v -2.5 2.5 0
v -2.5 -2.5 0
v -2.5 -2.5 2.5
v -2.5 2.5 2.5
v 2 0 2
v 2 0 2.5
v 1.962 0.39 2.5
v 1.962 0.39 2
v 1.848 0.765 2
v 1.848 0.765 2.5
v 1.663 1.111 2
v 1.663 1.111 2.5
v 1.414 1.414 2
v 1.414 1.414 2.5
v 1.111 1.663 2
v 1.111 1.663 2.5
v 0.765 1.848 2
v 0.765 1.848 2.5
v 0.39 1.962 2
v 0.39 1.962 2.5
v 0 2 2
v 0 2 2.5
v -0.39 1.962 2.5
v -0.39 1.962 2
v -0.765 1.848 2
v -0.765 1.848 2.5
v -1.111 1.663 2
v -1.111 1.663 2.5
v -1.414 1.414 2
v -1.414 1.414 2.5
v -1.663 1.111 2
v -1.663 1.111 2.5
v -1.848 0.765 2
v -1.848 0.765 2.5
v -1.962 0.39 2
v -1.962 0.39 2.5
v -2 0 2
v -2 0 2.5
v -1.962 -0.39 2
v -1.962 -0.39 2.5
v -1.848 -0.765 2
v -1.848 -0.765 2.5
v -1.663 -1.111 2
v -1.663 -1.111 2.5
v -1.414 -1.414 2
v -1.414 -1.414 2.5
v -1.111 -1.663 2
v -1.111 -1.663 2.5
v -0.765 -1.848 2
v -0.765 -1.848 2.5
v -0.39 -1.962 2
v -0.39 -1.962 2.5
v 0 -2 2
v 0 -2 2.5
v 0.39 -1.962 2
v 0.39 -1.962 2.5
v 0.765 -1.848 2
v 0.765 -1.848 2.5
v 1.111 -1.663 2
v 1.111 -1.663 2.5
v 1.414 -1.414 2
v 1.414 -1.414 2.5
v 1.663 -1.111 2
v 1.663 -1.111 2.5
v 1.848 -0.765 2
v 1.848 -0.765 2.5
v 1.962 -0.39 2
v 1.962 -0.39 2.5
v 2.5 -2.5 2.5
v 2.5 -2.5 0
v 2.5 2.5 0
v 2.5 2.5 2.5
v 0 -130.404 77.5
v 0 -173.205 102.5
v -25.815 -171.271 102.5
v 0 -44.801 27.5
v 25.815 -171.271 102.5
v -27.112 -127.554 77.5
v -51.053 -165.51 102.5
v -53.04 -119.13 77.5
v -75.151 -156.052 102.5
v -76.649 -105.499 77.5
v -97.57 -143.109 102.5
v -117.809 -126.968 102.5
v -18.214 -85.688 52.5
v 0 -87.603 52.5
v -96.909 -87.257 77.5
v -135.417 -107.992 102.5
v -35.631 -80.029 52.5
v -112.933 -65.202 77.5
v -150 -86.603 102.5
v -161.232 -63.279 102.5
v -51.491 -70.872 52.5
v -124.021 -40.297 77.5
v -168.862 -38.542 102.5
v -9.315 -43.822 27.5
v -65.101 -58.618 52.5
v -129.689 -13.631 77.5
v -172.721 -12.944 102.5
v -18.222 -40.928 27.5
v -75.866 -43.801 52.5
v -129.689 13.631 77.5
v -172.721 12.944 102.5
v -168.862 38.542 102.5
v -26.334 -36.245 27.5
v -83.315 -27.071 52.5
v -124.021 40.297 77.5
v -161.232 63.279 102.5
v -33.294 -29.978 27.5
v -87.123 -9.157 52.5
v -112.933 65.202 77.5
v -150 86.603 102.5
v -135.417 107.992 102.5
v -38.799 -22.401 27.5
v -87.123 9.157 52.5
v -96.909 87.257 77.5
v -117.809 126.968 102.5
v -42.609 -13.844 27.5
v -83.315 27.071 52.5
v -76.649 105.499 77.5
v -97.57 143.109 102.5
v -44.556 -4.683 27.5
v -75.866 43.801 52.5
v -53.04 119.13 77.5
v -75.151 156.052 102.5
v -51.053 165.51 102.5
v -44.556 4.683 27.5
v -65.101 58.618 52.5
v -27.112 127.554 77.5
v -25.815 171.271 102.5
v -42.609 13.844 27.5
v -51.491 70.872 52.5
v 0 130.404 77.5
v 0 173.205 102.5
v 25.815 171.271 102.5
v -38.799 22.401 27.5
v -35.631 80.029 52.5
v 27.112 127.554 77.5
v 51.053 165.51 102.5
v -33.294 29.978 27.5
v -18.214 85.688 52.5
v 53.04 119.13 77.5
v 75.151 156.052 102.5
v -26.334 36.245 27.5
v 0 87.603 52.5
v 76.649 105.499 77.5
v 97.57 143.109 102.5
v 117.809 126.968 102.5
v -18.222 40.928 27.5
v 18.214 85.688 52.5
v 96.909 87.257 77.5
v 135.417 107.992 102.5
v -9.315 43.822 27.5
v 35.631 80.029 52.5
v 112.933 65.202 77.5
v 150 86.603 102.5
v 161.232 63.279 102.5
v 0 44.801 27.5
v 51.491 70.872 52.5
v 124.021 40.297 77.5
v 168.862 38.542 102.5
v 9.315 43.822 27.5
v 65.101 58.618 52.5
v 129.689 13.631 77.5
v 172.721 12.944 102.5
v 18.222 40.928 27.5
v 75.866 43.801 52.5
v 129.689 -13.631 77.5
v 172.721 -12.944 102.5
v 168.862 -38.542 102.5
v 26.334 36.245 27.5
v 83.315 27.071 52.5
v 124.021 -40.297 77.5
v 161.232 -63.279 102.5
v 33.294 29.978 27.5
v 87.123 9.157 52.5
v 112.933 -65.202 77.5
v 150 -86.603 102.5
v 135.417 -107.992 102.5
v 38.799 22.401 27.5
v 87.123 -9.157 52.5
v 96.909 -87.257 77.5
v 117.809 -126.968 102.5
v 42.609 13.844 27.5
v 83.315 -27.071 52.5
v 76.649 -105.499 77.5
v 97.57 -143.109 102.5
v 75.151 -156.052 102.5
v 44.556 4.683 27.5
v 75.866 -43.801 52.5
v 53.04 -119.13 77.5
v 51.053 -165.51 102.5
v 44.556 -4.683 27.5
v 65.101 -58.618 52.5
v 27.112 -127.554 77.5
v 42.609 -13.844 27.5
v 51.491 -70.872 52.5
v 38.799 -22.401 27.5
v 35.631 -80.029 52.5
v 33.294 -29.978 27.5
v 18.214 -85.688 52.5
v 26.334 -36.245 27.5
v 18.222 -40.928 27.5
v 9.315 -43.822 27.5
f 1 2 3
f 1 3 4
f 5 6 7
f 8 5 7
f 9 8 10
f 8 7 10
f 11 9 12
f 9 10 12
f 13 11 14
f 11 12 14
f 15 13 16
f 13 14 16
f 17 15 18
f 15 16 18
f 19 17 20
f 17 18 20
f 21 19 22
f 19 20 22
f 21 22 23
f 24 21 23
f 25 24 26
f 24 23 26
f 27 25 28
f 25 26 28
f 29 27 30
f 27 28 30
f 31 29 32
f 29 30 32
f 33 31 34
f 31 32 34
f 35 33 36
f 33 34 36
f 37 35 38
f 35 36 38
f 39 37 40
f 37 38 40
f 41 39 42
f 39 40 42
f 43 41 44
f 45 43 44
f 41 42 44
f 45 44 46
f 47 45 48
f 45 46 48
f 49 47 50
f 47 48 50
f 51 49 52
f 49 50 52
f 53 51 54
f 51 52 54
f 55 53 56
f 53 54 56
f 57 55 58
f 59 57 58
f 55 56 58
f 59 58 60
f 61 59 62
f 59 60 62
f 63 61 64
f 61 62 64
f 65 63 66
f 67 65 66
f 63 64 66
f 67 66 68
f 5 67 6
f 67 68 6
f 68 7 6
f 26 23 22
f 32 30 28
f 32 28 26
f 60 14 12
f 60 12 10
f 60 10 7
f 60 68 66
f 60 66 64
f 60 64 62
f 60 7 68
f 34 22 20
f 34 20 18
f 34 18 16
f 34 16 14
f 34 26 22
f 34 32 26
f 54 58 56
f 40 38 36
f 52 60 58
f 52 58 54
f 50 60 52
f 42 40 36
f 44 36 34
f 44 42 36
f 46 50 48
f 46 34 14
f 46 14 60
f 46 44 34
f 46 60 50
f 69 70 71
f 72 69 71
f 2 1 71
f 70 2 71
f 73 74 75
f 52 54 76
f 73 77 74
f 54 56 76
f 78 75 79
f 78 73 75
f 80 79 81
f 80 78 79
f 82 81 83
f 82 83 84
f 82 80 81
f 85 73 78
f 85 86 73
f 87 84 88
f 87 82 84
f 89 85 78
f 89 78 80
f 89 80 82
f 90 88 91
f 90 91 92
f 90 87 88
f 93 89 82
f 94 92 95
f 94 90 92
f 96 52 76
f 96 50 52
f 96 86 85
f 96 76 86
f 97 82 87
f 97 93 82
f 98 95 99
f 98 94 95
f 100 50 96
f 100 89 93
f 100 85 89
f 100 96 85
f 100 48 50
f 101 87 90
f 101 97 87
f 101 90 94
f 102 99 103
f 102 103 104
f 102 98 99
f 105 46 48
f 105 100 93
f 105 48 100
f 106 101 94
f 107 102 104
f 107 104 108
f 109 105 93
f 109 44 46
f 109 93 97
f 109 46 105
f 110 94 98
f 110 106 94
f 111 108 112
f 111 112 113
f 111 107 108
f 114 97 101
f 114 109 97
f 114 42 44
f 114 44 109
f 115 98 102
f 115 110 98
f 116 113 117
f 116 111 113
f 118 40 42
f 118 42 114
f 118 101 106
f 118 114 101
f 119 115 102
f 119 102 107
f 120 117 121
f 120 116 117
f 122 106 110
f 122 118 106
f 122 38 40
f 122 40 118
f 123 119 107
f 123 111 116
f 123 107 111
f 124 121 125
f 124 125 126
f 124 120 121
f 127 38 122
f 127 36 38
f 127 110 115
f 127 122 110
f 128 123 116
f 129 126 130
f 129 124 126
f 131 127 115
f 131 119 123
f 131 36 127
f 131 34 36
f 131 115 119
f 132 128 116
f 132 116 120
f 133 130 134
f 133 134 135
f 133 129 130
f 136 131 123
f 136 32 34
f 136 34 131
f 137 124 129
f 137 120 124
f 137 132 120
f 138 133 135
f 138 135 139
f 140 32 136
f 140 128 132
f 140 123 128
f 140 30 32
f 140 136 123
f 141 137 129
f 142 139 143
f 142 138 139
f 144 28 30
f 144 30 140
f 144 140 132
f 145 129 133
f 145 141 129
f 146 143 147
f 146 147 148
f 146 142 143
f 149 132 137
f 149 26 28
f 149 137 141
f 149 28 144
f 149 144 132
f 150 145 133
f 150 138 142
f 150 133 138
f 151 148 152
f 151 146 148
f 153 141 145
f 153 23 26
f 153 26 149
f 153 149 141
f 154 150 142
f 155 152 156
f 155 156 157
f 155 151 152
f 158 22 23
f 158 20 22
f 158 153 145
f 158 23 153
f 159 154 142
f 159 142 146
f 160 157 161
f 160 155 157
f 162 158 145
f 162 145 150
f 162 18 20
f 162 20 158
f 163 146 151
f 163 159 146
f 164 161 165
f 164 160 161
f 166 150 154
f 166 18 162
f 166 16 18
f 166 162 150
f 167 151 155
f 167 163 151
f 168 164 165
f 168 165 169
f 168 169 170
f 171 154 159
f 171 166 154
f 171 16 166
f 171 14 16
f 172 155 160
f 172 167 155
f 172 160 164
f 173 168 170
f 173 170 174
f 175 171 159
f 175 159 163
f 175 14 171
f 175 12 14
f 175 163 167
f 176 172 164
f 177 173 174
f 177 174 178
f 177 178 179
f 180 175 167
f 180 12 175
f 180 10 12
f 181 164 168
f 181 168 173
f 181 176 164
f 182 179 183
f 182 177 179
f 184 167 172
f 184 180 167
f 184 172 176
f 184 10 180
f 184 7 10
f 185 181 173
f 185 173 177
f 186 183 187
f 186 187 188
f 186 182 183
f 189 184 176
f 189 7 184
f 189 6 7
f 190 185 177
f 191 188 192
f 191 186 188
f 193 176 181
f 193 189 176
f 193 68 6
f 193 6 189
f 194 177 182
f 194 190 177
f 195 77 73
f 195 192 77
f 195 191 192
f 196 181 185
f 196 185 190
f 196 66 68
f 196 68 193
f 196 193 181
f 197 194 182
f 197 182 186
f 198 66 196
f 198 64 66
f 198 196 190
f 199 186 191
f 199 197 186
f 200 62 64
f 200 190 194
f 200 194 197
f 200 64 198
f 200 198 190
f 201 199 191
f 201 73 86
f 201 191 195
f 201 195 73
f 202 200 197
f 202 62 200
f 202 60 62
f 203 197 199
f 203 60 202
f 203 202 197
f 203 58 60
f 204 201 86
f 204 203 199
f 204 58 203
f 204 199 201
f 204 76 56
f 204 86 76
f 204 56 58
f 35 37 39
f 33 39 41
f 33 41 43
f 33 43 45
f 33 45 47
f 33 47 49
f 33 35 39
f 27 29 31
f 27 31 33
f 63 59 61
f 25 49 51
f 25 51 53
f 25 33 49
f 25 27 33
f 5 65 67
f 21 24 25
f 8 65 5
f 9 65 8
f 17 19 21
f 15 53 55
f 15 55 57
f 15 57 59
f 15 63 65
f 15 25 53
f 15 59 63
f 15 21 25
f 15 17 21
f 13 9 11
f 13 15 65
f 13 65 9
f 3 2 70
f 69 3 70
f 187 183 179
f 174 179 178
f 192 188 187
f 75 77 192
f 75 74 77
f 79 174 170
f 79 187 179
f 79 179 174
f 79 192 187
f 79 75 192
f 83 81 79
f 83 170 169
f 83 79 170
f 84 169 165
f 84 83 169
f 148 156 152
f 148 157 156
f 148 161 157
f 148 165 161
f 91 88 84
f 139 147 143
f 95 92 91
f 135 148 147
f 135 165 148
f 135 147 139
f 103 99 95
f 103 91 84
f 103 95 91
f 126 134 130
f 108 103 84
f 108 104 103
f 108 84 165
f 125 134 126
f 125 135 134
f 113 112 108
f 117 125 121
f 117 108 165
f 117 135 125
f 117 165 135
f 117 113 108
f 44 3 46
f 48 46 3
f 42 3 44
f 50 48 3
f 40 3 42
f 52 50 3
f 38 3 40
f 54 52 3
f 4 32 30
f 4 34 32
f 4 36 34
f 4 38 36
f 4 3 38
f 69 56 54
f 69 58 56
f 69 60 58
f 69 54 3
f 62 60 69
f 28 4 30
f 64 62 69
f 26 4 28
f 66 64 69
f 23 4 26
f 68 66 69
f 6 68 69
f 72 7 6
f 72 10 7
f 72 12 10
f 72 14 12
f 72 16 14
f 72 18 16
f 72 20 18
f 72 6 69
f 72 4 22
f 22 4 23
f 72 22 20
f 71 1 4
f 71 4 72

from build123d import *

# Parameters (mm, degrees)
F0_W     = 5
F0_H     = 5
F1_DEPTH = 2.5
F2_R     = 2
F3_DEPTH = 0.5


with BuildPart() as f1:
    # F0 (on Top) → F1 (new body)
    with BuildSketch(Plane.XY):
        Rectangle(F0_W, F0_H)
    extrude(amount=F1_DEPTH)

    # F2 (on face) → F3 (cut)
    with BuildSketch(Plane.XY.offset(2.5)):
        Circle(F2_R)
    extrude(amount=-F3_DEPTH, mode=Mode.SUBTRACT)


with BuildPart() as f5:
    # F4 (on Right) → F5 (revolve)
    with BuildSketch(Plane.YZ):
        Polygon((-173.205081, 102.5), (-2, 2.5), (0, 2.5), (0, 102.5), align=None)
    revolve(axis=Axis((0, 0, 52.5), (0, 0, -1)))


solid = Compound([f1.part, f5.part])
